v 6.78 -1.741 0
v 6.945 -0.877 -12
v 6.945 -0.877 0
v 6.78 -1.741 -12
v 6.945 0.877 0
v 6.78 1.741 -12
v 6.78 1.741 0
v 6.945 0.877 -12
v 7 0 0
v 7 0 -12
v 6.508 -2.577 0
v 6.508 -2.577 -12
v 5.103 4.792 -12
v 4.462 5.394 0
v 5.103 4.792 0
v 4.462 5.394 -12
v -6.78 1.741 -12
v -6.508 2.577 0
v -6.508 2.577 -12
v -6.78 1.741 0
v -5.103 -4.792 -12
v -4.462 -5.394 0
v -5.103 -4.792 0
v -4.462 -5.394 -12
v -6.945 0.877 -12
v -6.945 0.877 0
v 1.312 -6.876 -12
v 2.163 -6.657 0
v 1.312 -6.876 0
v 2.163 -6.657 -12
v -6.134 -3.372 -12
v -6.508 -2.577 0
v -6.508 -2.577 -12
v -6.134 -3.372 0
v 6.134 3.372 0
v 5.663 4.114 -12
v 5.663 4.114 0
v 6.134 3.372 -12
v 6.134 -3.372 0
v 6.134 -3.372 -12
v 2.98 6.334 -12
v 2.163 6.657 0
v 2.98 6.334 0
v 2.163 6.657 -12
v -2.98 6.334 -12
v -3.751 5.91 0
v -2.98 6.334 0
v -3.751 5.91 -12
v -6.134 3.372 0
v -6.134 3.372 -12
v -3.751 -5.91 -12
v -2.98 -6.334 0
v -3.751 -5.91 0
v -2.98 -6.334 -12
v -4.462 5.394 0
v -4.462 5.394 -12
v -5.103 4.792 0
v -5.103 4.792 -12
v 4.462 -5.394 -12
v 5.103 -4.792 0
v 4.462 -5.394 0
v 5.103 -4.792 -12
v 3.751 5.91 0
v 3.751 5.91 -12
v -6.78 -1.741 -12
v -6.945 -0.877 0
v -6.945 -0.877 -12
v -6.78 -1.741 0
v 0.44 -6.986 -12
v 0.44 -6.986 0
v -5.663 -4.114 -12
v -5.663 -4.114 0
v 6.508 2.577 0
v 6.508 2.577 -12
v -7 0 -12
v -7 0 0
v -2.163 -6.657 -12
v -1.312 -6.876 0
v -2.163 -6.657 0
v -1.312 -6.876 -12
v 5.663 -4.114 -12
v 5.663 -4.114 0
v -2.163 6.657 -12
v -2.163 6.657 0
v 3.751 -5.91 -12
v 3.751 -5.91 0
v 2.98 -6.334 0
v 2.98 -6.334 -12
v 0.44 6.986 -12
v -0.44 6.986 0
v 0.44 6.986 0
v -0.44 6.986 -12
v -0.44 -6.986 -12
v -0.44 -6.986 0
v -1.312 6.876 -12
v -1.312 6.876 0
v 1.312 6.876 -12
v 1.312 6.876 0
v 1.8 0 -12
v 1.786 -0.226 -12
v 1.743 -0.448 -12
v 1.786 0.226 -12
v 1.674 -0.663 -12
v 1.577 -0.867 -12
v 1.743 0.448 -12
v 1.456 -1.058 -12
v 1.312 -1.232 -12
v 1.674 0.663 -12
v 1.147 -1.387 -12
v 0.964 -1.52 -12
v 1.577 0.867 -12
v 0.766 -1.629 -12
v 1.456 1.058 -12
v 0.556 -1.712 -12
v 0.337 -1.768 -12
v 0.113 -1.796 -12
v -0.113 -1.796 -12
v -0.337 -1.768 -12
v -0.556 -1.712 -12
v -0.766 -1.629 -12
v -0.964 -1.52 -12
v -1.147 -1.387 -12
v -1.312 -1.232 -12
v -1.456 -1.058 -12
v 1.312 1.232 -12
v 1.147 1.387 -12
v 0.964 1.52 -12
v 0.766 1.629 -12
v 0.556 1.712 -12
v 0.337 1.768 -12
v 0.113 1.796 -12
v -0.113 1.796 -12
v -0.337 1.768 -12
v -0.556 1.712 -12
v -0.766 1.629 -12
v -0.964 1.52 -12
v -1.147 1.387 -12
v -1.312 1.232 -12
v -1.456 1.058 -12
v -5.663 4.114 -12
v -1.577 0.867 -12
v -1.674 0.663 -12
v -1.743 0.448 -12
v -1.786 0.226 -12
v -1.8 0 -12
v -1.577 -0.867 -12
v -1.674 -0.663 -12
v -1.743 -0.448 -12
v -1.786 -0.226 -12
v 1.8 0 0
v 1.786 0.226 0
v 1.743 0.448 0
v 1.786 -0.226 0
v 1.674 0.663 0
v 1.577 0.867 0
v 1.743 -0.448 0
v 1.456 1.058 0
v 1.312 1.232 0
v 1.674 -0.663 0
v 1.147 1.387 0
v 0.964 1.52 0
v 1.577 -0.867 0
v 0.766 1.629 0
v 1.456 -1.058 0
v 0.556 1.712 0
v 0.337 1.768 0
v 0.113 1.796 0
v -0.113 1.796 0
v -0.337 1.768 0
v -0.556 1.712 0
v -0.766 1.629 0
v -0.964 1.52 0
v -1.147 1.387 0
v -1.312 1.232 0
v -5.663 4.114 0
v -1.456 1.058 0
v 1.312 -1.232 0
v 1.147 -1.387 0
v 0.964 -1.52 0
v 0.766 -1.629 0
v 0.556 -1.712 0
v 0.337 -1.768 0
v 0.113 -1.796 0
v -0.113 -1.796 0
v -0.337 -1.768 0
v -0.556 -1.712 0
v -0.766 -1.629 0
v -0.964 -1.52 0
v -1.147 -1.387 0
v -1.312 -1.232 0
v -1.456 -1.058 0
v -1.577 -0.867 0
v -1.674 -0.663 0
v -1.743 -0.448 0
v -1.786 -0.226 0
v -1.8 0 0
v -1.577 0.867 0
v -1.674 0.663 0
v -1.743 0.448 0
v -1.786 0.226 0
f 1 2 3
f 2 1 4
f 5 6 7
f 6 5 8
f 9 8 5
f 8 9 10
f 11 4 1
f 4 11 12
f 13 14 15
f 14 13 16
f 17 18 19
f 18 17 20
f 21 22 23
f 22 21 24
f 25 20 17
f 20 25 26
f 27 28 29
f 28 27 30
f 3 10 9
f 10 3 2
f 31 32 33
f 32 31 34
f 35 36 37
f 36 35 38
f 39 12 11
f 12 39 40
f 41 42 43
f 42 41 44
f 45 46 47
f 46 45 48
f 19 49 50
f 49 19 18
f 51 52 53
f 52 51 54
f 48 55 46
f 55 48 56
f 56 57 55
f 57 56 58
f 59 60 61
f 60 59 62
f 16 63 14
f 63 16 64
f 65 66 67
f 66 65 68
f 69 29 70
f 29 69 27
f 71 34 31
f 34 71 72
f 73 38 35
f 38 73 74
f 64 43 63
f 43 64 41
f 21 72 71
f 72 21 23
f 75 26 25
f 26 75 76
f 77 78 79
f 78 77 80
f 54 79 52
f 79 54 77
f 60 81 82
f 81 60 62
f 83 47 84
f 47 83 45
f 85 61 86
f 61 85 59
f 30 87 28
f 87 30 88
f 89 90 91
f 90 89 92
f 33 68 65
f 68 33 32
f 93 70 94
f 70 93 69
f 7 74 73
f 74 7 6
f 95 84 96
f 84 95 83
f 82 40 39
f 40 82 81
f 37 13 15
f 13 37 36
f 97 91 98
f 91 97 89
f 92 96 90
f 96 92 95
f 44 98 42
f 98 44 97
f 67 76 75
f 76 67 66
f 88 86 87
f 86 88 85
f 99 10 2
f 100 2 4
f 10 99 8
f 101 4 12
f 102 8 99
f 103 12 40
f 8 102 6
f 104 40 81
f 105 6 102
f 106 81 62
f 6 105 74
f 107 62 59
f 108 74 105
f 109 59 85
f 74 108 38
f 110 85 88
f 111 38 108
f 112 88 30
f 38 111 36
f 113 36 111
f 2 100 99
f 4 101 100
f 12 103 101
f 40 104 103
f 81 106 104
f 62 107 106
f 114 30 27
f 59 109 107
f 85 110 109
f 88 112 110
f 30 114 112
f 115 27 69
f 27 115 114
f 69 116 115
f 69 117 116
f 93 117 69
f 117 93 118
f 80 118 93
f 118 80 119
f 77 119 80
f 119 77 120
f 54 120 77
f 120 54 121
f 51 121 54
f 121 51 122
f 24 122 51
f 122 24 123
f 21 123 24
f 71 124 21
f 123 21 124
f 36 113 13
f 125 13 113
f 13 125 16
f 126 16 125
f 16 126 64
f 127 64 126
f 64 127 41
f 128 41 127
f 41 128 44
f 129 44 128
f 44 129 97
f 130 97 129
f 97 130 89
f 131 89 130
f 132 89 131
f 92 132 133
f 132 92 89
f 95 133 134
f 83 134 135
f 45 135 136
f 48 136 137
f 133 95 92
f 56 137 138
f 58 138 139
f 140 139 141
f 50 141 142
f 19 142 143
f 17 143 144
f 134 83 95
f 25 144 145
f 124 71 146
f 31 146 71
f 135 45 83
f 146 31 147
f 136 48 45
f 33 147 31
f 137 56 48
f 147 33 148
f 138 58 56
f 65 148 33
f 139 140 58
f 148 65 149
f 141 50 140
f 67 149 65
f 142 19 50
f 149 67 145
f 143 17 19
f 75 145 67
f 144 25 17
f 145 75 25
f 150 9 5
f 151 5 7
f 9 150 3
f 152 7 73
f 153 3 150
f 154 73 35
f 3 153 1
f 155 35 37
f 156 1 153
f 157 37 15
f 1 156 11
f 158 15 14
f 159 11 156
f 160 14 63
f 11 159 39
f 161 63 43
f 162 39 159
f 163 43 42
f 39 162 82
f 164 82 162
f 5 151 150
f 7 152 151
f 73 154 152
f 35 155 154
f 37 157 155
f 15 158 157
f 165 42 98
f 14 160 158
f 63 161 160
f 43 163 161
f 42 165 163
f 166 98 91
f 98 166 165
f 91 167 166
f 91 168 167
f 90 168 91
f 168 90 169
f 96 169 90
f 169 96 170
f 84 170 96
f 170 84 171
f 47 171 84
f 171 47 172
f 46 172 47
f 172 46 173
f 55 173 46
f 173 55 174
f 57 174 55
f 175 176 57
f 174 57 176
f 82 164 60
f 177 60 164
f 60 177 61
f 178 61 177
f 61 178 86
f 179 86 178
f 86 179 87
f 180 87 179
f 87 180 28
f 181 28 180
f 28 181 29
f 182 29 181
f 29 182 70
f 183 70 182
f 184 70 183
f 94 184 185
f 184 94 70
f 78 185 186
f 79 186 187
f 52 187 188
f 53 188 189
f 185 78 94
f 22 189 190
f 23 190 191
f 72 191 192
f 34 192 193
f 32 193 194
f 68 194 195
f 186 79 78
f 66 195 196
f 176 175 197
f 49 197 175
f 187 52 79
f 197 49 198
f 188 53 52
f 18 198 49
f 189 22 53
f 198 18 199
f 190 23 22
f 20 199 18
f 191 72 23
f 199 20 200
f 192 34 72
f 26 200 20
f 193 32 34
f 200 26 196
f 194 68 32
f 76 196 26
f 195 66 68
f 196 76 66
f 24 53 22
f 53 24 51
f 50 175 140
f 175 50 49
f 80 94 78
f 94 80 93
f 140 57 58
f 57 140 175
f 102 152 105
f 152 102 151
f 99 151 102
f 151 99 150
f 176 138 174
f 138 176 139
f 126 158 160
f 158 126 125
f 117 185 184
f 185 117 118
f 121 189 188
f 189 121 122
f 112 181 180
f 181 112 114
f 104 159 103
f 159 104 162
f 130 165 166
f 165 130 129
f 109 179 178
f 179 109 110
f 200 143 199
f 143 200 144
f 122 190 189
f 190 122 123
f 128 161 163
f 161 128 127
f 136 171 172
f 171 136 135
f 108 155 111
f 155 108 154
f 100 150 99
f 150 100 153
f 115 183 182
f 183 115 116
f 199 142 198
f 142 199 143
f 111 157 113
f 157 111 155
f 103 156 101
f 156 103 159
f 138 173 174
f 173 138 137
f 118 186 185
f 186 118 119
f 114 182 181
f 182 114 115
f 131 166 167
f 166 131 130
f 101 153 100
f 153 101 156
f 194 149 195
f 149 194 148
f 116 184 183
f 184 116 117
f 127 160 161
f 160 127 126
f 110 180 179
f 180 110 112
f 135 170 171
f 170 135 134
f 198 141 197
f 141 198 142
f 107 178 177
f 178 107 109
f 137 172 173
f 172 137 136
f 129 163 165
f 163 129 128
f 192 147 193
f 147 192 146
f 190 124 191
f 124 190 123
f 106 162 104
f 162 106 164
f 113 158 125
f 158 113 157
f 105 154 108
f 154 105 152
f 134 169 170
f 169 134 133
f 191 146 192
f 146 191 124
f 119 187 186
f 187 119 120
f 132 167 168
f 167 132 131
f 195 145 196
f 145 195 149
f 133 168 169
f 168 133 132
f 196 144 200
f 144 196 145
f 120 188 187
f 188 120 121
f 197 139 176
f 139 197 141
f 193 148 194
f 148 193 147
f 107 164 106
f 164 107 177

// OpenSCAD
$fn = 50;


difference() {
	union() {
		translate(v = [0, 0, -12.0000000000]) {
			cylinder(h = 12, r = 7.0000000000);
		}
		cylinder(h = 0, r = 16.0000000000);
	}
	union() {
		#translate(v = [0, 0, -12]) {
			cylinder(h = 12, r = 1.8000000000);
		}
	}
}
